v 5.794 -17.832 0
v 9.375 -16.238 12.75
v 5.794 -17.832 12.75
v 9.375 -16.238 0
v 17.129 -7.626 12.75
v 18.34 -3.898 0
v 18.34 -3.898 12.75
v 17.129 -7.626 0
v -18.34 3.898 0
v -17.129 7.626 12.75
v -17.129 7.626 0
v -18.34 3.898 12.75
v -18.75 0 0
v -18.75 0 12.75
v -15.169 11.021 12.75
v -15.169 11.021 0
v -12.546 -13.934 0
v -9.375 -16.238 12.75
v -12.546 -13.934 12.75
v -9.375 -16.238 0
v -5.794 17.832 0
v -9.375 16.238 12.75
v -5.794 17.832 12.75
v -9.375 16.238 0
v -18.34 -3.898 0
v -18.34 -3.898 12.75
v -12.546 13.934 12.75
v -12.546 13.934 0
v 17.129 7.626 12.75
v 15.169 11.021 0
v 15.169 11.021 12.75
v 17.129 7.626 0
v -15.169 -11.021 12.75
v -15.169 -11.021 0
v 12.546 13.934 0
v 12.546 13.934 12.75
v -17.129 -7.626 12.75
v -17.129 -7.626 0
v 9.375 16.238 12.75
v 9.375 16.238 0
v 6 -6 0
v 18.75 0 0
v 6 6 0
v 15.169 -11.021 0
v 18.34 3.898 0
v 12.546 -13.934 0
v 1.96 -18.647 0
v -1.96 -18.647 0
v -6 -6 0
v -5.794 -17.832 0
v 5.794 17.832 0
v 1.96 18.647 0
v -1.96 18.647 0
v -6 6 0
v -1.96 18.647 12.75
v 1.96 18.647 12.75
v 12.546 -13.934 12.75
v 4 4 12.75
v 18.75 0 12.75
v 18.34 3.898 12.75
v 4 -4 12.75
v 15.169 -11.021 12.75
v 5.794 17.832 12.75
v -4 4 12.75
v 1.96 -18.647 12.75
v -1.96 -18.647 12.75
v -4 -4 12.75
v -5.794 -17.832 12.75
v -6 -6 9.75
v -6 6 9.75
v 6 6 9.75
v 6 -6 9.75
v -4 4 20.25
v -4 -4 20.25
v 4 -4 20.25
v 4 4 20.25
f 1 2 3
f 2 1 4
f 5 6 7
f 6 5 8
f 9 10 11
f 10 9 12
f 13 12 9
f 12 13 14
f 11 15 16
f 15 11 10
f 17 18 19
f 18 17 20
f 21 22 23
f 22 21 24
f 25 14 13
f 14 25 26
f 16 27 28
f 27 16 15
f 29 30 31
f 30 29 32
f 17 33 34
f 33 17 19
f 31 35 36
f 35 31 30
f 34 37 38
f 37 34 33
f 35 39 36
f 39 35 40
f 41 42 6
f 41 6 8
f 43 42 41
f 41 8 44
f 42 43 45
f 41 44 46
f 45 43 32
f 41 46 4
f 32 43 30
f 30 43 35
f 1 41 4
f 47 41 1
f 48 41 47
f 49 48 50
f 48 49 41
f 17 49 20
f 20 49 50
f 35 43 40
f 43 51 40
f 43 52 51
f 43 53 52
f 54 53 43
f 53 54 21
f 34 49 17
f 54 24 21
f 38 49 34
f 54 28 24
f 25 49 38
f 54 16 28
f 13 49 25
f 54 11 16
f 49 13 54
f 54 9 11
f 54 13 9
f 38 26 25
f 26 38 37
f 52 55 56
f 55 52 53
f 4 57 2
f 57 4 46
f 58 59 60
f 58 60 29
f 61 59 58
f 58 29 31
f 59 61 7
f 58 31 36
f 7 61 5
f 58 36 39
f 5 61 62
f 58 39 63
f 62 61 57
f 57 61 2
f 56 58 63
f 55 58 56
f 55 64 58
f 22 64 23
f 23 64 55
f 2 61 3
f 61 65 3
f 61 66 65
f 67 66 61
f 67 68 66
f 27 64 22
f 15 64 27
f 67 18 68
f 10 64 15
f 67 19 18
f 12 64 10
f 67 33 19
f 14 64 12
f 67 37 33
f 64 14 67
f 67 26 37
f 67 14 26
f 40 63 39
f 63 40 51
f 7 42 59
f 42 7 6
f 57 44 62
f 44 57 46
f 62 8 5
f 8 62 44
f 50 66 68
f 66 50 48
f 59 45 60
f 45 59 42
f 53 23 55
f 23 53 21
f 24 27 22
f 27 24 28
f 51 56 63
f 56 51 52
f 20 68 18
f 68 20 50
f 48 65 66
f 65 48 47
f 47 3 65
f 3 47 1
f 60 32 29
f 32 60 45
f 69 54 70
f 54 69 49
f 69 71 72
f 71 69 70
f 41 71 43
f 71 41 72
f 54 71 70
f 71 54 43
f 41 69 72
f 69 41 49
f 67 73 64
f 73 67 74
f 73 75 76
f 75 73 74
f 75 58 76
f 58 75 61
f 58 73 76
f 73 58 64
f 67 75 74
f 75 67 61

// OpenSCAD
//scale(0.75)rotate([0,180,0])handle();
scale(0.75)rotate([0,180,0])adaptor();
//scale(0.75)rotate([180,0,0])shovel();

//this function generates each handle segment for the shovel
module adaptor
(
	height = 17, // the height in mm of the handle
	radius = 25, // the radius in mm of the handle
	fit_size = 16, // length and width of square connector in mm
	fit_height = 14 // the depth in mm of the square connector
)
{
	small_fit = 8.75 * (4/3);
	difference( )
	{
		translate( [ 0, 0, -height / 2 ] )
		cylinder( r = radius, h = height, center = true );

		translate( [ -fit_size / 2, -fit_size / 2, -fit_height + 1 ] )
		cube( [ fit_size, fit_size, fit_height ] );
	}
	translate( [ -( small_fit - 1 ) / 2, -( small_fit - 1 ) / 2, -height - 10 ] )
	cube( [ small_fit - 1, small_fit - 1, fit_height - 1 ] );
}

//this function generates each handle segment for the shovel
module handle
(
	height = 127, // the height in mm of the handle
	radius = 25, // the radius in mm of the handle
	fit_size = 16, // length and width of square connector in mm
	fit_height = 14 // the depth in mm of the square connector
)
{
	difference( )
	{
		translate( [ 0, 0, -height / 2 ] )
		cylinder( r = radius, h = height, center = true );

		translate( [ -fit_size / 2, -fit_size / 2, -fit_height + 1 ] )
		cube( [ fit_size, fit_size, fit_height ] );
	}
	translate( [ -( fit_size - 1 ) / 2, -( fit_size - 1 ) / 2, -height - 10 ] )
	cube( [ fit_size - 1, fit_size - 1, fit_height - 1 ] );
}

//this is a helper function for the shovel end
module handle_reciever
(
	height = 50, // the length in mm of the support beam that supports the handle
	radius = 25, // the radius in mm of the support beam that supports the handle
	fit_size = 16,
	fit_height = 20
)
{
	translate( [ -fit_size / 2, -fit_size / 2, -fit_height + 1 ] )
	cube( [ fit_size, fit_size, fit_height ] );
}

//this is a helper function for the shovel end
module shovel_support
( 
	height = 50, 
	radius = 25, 
	fit_size = 16, 
	fit_height = 14 
)
{
	difference()
	{
		translate( [ 0, 0, -height / 2 ] )
		cylinder( r = radius, h = height, center = true );

		translate( [ -fit_size / 2, -fit_size / 2, -fit_height + 1 ] )
		cube( [ fit_size, fit_size, fit_height ] );
	}
}


// this module constructs the actual shovel end support
module shovel
( 
	shovel_height = 200, //the length of the shovel before in-function scaling occurs
	shovel_width = 80  //the width of the shovel before in-function scaling occurs
)
{
	difference( )
	{
		minkowski( )
		{
			union( )
			{
				translate( [ 0, -40, -shovel_height / 2 ] )
				difference( )
				{
					scale( [ 2.5, 1, 1 ] )
					cylinder( r = shovel_width / 2, h = shovel_height, center=true );

					rotate( [ 7, 0, 0 ] )
					translate( [ 0, -shovel_height *  10 / 150, -15 ] )
					scale( [ 2.5, 1, 1 ] )
					cylinder( r = shovel_width / 2 , h = shovel_height, center=true );
				}

				translate( [ 0, -20, 0 ] )
				scale( 0.75 )
				rotate( [ 0, 0, 0 ] )
				shovel_support( );
			}
			sphere( 2 );
		}
		translate( [ 0, -20, 2 ] )
		scale( 0.75 )
		rotate( [ 0, 0, 0 ] )
		handle_reciever( );
	}

}
